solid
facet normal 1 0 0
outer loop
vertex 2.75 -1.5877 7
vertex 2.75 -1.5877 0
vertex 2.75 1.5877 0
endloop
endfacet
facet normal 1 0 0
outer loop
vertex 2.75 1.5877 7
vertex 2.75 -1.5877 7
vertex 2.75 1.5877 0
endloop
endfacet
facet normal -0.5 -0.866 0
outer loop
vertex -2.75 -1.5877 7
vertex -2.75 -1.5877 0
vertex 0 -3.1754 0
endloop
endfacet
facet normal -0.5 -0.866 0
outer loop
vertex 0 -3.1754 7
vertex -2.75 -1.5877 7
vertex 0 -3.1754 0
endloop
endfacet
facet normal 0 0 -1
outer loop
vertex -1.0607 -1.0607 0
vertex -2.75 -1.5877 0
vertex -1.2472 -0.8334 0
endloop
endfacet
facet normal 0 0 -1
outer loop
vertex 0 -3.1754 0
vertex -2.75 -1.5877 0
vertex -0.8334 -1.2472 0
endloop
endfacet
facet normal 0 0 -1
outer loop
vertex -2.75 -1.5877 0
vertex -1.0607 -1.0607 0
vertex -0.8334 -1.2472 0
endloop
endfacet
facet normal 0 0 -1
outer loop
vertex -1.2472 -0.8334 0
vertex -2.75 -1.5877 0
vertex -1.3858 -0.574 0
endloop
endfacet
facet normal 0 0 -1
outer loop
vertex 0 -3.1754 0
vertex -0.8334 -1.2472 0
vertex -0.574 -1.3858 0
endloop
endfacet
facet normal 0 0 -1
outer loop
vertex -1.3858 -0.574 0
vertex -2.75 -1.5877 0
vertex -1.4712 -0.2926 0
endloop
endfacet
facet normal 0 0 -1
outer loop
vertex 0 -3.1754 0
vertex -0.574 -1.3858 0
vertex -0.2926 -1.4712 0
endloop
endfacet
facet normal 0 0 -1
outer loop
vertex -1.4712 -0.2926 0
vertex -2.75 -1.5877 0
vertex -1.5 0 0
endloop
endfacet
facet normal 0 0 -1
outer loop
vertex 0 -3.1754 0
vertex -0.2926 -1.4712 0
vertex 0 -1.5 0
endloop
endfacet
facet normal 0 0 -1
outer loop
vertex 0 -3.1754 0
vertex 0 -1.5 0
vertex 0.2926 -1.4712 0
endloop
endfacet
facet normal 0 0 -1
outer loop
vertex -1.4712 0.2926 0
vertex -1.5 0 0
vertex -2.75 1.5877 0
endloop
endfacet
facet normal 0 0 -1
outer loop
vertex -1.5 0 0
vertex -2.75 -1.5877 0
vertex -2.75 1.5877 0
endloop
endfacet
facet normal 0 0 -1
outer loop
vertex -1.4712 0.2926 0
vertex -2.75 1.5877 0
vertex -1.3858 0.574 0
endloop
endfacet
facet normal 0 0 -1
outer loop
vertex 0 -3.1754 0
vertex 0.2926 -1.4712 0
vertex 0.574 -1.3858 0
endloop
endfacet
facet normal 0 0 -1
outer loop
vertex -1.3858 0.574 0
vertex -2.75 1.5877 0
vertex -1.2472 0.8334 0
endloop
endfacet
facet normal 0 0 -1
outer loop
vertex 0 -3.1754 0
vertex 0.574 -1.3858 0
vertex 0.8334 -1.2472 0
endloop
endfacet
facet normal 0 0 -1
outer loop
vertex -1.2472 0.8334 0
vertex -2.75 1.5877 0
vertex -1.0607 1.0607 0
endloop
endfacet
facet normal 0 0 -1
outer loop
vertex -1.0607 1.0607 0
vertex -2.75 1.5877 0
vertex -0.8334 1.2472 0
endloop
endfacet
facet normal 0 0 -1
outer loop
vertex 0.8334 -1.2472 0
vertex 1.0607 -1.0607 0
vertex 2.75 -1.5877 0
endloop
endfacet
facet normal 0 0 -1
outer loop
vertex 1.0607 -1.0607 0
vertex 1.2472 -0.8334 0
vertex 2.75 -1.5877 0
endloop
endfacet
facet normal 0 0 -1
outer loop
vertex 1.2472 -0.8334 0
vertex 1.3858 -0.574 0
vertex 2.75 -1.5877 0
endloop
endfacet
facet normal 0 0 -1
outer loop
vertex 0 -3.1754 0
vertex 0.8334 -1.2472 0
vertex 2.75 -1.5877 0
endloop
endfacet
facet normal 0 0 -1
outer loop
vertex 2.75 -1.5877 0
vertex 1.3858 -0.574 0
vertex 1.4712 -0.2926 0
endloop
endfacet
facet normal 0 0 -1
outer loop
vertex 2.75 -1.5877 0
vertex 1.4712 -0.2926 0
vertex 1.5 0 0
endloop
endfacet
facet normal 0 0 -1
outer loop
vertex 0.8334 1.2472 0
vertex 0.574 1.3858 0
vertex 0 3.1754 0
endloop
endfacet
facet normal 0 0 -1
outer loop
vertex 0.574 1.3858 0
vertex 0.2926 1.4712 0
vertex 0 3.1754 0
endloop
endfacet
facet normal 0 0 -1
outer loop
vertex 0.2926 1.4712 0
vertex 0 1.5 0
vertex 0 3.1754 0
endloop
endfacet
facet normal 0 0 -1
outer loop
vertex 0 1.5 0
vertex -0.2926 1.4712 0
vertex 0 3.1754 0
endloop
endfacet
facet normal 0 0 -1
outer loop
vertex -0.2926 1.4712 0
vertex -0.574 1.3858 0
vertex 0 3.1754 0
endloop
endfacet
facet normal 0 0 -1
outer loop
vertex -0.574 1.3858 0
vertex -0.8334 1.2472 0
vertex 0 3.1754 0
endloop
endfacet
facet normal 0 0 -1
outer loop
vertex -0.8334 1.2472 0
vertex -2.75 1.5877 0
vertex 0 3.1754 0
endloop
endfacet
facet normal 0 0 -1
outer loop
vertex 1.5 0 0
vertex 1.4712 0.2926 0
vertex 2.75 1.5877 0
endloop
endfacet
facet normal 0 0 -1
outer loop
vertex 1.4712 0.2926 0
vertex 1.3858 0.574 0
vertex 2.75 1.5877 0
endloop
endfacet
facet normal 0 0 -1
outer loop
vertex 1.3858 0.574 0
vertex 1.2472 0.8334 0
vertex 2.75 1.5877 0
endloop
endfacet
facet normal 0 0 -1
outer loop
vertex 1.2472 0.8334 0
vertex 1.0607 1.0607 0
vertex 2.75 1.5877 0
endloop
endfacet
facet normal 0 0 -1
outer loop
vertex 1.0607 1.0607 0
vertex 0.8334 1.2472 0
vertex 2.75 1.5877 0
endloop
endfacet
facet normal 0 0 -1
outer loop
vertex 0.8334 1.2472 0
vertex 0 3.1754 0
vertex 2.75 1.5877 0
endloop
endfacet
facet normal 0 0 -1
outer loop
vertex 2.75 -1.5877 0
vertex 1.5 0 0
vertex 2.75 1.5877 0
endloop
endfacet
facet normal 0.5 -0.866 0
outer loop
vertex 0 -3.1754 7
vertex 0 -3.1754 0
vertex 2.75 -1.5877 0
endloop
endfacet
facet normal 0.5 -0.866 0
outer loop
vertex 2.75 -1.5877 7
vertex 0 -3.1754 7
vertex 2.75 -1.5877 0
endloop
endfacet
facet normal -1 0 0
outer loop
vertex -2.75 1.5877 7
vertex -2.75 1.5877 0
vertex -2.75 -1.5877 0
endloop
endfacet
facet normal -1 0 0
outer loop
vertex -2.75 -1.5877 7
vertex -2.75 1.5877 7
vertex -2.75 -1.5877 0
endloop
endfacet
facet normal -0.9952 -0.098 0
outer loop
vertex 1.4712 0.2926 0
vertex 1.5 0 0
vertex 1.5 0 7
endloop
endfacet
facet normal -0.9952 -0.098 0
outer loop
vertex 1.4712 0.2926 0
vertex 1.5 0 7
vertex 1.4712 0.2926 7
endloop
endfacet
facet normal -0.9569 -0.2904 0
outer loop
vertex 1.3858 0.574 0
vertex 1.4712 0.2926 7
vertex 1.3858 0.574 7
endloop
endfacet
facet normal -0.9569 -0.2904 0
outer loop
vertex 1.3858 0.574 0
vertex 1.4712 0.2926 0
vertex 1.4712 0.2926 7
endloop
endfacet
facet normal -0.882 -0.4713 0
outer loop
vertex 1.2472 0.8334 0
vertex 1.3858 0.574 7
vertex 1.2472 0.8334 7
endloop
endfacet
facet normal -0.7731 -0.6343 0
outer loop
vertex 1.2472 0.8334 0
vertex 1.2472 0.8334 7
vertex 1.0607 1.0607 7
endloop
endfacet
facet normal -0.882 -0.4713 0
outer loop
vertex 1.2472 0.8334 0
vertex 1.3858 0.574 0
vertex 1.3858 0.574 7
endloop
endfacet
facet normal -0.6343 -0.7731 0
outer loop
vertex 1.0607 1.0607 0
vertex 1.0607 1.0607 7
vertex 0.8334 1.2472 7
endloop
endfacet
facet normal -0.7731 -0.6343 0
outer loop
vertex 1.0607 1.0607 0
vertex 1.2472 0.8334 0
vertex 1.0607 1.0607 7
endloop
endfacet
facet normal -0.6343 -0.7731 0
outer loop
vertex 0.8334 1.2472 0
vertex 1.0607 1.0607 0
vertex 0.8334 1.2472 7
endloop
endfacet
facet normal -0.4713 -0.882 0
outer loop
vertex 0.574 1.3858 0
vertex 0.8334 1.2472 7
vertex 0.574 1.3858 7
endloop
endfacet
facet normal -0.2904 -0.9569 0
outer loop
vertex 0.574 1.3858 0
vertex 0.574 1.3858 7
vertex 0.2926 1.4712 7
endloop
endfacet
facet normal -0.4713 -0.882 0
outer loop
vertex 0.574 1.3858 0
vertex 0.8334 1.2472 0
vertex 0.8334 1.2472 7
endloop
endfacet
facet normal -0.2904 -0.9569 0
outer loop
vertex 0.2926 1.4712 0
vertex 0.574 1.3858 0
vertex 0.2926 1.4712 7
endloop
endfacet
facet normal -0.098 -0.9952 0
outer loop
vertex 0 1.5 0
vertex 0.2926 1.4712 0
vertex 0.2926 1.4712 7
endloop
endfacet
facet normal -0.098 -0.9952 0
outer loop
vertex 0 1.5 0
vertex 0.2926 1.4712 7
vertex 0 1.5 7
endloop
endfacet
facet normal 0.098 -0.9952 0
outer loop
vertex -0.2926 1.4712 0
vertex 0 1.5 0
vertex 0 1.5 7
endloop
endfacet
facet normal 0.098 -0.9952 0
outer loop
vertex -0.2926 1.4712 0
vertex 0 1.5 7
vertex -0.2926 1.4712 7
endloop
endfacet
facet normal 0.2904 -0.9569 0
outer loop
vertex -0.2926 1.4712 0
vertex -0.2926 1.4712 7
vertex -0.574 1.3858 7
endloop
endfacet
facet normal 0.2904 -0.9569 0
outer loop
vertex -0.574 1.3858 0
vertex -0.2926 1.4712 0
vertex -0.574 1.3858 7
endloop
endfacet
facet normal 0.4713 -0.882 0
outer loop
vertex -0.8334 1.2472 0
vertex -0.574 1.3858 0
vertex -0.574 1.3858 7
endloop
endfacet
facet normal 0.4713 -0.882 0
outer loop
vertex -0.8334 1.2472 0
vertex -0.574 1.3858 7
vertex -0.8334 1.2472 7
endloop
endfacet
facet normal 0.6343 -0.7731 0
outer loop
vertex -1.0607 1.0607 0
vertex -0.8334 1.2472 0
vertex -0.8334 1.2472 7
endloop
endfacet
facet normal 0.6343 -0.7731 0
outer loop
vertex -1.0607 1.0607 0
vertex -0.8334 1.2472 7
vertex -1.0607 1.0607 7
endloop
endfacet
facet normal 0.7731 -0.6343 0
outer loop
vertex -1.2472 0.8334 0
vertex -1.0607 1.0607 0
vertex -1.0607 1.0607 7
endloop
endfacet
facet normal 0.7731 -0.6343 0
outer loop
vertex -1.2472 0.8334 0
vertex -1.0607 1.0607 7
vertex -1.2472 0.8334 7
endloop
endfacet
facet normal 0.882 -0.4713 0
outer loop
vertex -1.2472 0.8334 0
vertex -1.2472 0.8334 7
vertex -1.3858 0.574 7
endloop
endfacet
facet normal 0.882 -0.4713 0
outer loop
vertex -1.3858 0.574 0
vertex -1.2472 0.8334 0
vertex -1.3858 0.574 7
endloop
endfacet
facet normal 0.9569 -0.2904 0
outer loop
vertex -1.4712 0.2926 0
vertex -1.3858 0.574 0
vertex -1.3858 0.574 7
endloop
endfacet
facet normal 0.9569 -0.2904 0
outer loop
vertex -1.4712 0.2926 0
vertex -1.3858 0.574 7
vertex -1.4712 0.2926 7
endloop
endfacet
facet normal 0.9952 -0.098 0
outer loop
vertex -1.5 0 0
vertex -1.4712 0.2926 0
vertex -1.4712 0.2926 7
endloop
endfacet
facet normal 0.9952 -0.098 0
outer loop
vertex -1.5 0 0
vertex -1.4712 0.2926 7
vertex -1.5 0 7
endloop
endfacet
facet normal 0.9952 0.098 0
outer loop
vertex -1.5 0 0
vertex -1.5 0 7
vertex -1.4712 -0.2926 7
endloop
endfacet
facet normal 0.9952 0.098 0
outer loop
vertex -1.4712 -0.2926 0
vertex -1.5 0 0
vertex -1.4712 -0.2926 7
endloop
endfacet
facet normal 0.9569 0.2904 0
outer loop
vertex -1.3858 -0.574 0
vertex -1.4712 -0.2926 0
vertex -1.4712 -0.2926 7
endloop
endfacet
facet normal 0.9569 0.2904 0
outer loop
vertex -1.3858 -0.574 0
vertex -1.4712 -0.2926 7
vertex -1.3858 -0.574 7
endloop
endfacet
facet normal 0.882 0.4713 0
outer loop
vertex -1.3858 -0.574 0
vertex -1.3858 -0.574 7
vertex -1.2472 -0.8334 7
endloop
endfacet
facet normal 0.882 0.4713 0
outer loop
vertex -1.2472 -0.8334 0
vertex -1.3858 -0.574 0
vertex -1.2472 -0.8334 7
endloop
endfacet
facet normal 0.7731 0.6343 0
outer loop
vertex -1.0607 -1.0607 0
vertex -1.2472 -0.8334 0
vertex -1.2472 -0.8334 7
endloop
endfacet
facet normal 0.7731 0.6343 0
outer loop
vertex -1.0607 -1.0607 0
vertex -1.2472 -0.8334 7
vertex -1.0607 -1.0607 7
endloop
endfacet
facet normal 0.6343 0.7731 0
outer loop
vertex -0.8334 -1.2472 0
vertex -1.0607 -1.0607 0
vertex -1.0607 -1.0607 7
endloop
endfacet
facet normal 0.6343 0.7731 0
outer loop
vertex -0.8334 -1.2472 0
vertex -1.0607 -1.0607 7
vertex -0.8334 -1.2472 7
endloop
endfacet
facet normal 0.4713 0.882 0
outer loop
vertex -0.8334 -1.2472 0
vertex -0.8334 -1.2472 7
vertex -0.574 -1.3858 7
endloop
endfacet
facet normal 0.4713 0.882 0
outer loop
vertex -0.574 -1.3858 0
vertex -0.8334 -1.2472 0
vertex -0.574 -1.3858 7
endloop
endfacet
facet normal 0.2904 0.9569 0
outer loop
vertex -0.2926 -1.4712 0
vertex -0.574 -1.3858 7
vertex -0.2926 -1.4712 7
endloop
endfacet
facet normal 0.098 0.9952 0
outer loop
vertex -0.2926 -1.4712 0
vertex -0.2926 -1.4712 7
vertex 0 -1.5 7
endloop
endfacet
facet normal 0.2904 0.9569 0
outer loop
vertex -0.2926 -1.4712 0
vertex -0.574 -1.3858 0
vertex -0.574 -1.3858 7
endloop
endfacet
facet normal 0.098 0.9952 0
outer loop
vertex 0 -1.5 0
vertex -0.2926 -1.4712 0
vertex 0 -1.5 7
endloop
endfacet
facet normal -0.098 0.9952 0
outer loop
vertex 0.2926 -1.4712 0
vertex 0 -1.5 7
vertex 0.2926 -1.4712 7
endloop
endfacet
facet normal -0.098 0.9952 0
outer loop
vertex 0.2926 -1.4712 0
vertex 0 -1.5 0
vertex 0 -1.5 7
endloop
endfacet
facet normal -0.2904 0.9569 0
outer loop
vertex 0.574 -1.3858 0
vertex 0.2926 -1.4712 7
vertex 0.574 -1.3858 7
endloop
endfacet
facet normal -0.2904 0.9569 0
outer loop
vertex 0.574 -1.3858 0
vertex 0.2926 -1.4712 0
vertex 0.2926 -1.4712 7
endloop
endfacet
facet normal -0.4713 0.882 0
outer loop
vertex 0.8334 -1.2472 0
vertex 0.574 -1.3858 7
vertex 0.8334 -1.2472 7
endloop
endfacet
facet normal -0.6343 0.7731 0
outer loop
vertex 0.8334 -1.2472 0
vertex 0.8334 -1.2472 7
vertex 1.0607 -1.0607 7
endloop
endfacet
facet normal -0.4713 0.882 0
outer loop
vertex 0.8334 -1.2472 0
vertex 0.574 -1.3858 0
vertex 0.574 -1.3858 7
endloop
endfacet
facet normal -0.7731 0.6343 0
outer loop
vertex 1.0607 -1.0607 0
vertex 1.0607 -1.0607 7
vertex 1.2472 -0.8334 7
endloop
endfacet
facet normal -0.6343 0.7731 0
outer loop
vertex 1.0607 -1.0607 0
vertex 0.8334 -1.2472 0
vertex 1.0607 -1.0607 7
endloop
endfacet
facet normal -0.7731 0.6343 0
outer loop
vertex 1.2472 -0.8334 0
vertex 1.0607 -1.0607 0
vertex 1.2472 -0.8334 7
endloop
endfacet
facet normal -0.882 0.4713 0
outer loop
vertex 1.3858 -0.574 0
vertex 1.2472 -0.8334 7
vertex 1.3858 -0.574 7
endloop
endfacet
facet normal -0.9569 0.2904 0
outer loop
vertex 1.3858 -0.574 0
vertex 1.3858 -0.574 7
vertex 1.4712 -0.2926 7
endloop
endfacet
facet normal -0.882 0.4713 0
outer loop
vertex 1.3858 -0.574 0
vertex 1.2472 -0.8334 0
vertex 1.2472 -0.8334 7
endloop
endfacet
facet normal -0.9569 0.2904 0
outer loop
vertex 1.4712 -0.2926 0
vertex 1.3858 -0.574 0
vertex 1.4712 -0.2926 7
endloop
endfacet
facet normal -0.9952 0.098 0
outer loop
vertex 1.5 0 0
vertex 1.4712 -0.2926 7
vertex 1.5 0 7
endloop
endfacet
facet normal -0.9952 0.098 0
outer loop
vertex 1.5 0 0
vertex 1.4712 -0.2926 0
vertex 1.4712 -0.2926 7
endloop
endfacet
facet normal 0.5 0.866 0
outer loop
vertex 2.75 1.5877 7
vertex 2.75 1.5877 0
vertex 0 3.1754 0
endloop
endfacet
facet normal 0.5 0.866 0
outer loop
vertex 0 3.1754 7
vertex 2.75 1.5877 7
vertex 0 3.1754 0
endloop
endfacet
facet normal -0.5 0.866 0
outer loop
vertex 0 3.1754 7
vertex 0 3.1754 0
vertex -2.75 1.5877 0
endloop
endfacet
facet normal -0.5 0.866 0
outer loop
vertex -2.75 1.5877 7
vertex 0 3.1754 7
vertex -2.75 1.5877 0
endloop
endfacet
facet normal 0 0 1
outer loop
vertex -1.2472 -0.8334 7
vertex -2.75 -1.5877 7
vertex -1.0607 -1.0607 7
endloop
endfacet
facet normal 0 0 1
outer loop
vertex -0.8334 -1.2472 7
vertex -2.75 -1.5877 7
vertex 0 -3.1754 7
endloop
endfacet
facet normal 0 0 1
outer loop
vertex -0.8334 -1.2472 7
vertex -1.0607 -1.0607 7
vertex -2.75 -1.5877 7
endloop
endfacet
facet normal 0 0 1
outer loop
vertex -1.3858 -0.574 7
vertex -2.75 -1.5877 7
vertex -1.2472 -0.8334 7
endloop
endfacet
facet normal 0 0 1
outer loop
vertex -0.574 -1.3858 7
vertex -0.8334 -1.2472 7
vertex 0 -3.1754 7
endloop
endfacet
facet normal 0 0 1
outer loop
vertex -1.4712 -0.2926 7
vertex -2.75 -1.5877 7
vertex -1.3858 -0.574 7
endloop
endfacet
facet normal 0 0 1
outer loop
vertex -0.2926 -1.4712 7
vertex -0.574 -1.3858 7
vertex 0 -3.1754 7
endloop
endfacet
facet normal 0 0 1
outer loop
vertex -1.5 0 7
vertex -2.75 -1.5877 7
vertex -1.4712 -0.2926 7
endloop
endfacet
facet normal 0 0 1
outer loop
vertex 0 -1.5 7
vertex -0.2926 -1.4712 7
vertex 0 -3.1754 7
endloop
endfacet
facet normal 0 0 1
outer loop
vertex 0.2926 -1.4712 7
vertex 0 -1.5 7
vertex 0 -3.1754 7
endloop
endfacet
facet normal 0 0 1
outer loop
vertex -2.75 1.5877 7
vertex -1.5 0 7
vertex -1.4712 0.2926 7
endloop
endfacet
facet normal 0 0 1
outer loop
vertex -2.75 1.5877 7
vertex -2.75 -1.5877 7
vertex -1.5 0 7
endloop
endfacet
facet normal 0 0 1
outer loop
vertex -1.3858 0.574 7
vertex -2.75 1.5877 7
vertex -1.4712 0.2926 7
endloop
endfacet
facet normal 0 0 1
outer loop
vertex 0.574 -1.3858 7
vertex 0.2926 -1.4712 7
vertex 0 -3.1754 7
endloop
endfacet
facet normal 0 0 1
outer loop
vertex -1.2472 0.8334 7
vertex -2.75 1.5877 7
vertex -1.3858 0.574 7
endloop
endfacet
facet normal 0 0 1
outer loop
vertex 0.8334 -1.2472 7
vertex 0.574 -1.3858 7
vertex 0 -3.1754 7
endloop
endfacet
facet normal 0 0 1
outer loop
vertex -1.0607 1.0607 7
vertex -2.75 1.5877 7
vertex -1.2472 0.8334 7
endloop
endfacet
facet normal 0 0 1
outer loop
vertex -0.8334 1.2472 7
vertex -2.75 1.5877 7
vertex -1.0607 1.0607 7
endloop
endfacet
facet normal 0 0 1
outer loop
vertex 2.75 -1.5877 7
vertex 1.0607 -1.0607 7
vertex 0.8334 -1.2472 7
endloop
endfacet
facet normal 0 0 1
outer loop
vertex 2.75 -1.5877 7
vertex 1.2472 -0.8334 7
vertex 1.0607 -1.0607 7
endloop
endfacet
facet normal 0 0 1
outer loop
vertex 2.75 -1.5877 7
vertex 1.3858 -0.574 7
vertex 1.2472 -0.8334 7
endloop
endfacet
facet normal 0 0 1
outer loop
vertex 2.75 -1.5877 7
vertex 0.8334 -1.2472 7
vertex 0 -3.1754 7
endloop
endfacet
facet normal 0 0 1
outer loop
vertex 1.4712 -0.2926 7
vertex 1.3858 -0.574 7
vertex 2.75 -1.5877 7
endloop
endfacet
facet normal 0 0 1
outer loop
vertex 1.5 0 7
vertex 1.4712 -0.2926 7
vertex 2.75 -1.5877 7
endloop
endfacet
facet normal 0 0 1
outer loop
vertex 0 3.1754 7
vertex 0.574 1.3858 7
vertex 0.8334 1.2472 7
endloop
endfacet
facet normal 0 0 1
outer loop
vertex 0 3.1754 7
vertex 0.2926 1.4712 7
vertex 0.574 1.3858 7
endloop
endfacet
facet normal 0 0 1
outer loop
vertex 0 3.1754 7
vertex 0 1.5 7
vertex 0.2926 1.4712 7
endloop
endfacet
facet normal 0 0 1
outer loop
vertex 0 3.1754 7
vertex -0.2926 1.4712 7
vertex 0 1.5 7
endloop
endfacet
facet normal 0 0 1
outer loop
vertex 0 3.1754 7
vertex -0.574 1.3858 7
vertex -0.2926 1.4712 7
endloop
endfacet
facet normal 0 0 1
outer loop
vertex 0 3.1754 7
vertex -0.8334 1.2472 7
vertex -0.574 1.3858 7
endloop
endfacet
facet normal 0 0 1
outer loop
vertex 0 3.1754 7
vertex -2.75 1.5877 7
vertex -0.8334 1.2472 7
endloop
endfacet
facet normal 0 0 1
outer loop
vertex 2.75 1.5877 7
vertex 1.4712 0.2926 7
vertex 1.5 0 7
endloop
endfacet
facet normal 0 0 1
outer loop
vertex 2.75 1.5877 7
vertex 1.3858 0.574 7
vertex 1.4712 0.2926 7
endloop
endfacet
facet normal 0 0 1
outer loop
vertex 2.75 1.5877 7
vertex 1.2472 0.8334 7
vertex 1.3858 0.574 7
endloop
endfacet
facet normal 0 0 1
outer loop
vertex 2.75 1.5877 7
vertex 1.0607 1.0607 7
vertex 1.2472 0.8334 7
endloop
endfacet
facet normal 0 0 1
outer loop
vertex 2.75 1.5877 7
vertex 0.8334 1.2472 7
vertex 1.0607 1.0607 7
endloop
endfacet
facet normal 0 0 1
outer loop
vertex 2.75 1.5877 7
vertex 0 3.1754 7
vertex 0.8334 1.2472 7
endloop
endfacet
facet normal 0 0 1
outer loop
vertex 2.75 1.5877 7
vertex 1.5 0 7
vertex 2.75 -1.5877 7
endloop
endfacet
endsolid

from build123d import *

# Parameters (mm, degrees)
F0_R     = 1.5
F1_DEPTH = 7
F2_DEPTH = 5


with BuildPart() as f1:
    # F0 (on Top) → F1 (new body)
    with BuildSketch(Plane.XY):
        Polygon((2.75, -1.587713), (2.75, 1.587713), (0, 3.175426), (-2.75, 1.587713), (-2.75, -1.587713), (0, -3.175426), align=None)
        Circle(F0_R, mode=Mode.SUBTRACT)
    extrude(amount=F1_DEPTH)

    # F0 (on Top) → F2 (cut)
    with BuildSketch(Plane.XY):
        Circle(F0_R)
    extrude(amount=F2_DEPTH, mode=Mode.SUBTRACT)


solid = f1.part
